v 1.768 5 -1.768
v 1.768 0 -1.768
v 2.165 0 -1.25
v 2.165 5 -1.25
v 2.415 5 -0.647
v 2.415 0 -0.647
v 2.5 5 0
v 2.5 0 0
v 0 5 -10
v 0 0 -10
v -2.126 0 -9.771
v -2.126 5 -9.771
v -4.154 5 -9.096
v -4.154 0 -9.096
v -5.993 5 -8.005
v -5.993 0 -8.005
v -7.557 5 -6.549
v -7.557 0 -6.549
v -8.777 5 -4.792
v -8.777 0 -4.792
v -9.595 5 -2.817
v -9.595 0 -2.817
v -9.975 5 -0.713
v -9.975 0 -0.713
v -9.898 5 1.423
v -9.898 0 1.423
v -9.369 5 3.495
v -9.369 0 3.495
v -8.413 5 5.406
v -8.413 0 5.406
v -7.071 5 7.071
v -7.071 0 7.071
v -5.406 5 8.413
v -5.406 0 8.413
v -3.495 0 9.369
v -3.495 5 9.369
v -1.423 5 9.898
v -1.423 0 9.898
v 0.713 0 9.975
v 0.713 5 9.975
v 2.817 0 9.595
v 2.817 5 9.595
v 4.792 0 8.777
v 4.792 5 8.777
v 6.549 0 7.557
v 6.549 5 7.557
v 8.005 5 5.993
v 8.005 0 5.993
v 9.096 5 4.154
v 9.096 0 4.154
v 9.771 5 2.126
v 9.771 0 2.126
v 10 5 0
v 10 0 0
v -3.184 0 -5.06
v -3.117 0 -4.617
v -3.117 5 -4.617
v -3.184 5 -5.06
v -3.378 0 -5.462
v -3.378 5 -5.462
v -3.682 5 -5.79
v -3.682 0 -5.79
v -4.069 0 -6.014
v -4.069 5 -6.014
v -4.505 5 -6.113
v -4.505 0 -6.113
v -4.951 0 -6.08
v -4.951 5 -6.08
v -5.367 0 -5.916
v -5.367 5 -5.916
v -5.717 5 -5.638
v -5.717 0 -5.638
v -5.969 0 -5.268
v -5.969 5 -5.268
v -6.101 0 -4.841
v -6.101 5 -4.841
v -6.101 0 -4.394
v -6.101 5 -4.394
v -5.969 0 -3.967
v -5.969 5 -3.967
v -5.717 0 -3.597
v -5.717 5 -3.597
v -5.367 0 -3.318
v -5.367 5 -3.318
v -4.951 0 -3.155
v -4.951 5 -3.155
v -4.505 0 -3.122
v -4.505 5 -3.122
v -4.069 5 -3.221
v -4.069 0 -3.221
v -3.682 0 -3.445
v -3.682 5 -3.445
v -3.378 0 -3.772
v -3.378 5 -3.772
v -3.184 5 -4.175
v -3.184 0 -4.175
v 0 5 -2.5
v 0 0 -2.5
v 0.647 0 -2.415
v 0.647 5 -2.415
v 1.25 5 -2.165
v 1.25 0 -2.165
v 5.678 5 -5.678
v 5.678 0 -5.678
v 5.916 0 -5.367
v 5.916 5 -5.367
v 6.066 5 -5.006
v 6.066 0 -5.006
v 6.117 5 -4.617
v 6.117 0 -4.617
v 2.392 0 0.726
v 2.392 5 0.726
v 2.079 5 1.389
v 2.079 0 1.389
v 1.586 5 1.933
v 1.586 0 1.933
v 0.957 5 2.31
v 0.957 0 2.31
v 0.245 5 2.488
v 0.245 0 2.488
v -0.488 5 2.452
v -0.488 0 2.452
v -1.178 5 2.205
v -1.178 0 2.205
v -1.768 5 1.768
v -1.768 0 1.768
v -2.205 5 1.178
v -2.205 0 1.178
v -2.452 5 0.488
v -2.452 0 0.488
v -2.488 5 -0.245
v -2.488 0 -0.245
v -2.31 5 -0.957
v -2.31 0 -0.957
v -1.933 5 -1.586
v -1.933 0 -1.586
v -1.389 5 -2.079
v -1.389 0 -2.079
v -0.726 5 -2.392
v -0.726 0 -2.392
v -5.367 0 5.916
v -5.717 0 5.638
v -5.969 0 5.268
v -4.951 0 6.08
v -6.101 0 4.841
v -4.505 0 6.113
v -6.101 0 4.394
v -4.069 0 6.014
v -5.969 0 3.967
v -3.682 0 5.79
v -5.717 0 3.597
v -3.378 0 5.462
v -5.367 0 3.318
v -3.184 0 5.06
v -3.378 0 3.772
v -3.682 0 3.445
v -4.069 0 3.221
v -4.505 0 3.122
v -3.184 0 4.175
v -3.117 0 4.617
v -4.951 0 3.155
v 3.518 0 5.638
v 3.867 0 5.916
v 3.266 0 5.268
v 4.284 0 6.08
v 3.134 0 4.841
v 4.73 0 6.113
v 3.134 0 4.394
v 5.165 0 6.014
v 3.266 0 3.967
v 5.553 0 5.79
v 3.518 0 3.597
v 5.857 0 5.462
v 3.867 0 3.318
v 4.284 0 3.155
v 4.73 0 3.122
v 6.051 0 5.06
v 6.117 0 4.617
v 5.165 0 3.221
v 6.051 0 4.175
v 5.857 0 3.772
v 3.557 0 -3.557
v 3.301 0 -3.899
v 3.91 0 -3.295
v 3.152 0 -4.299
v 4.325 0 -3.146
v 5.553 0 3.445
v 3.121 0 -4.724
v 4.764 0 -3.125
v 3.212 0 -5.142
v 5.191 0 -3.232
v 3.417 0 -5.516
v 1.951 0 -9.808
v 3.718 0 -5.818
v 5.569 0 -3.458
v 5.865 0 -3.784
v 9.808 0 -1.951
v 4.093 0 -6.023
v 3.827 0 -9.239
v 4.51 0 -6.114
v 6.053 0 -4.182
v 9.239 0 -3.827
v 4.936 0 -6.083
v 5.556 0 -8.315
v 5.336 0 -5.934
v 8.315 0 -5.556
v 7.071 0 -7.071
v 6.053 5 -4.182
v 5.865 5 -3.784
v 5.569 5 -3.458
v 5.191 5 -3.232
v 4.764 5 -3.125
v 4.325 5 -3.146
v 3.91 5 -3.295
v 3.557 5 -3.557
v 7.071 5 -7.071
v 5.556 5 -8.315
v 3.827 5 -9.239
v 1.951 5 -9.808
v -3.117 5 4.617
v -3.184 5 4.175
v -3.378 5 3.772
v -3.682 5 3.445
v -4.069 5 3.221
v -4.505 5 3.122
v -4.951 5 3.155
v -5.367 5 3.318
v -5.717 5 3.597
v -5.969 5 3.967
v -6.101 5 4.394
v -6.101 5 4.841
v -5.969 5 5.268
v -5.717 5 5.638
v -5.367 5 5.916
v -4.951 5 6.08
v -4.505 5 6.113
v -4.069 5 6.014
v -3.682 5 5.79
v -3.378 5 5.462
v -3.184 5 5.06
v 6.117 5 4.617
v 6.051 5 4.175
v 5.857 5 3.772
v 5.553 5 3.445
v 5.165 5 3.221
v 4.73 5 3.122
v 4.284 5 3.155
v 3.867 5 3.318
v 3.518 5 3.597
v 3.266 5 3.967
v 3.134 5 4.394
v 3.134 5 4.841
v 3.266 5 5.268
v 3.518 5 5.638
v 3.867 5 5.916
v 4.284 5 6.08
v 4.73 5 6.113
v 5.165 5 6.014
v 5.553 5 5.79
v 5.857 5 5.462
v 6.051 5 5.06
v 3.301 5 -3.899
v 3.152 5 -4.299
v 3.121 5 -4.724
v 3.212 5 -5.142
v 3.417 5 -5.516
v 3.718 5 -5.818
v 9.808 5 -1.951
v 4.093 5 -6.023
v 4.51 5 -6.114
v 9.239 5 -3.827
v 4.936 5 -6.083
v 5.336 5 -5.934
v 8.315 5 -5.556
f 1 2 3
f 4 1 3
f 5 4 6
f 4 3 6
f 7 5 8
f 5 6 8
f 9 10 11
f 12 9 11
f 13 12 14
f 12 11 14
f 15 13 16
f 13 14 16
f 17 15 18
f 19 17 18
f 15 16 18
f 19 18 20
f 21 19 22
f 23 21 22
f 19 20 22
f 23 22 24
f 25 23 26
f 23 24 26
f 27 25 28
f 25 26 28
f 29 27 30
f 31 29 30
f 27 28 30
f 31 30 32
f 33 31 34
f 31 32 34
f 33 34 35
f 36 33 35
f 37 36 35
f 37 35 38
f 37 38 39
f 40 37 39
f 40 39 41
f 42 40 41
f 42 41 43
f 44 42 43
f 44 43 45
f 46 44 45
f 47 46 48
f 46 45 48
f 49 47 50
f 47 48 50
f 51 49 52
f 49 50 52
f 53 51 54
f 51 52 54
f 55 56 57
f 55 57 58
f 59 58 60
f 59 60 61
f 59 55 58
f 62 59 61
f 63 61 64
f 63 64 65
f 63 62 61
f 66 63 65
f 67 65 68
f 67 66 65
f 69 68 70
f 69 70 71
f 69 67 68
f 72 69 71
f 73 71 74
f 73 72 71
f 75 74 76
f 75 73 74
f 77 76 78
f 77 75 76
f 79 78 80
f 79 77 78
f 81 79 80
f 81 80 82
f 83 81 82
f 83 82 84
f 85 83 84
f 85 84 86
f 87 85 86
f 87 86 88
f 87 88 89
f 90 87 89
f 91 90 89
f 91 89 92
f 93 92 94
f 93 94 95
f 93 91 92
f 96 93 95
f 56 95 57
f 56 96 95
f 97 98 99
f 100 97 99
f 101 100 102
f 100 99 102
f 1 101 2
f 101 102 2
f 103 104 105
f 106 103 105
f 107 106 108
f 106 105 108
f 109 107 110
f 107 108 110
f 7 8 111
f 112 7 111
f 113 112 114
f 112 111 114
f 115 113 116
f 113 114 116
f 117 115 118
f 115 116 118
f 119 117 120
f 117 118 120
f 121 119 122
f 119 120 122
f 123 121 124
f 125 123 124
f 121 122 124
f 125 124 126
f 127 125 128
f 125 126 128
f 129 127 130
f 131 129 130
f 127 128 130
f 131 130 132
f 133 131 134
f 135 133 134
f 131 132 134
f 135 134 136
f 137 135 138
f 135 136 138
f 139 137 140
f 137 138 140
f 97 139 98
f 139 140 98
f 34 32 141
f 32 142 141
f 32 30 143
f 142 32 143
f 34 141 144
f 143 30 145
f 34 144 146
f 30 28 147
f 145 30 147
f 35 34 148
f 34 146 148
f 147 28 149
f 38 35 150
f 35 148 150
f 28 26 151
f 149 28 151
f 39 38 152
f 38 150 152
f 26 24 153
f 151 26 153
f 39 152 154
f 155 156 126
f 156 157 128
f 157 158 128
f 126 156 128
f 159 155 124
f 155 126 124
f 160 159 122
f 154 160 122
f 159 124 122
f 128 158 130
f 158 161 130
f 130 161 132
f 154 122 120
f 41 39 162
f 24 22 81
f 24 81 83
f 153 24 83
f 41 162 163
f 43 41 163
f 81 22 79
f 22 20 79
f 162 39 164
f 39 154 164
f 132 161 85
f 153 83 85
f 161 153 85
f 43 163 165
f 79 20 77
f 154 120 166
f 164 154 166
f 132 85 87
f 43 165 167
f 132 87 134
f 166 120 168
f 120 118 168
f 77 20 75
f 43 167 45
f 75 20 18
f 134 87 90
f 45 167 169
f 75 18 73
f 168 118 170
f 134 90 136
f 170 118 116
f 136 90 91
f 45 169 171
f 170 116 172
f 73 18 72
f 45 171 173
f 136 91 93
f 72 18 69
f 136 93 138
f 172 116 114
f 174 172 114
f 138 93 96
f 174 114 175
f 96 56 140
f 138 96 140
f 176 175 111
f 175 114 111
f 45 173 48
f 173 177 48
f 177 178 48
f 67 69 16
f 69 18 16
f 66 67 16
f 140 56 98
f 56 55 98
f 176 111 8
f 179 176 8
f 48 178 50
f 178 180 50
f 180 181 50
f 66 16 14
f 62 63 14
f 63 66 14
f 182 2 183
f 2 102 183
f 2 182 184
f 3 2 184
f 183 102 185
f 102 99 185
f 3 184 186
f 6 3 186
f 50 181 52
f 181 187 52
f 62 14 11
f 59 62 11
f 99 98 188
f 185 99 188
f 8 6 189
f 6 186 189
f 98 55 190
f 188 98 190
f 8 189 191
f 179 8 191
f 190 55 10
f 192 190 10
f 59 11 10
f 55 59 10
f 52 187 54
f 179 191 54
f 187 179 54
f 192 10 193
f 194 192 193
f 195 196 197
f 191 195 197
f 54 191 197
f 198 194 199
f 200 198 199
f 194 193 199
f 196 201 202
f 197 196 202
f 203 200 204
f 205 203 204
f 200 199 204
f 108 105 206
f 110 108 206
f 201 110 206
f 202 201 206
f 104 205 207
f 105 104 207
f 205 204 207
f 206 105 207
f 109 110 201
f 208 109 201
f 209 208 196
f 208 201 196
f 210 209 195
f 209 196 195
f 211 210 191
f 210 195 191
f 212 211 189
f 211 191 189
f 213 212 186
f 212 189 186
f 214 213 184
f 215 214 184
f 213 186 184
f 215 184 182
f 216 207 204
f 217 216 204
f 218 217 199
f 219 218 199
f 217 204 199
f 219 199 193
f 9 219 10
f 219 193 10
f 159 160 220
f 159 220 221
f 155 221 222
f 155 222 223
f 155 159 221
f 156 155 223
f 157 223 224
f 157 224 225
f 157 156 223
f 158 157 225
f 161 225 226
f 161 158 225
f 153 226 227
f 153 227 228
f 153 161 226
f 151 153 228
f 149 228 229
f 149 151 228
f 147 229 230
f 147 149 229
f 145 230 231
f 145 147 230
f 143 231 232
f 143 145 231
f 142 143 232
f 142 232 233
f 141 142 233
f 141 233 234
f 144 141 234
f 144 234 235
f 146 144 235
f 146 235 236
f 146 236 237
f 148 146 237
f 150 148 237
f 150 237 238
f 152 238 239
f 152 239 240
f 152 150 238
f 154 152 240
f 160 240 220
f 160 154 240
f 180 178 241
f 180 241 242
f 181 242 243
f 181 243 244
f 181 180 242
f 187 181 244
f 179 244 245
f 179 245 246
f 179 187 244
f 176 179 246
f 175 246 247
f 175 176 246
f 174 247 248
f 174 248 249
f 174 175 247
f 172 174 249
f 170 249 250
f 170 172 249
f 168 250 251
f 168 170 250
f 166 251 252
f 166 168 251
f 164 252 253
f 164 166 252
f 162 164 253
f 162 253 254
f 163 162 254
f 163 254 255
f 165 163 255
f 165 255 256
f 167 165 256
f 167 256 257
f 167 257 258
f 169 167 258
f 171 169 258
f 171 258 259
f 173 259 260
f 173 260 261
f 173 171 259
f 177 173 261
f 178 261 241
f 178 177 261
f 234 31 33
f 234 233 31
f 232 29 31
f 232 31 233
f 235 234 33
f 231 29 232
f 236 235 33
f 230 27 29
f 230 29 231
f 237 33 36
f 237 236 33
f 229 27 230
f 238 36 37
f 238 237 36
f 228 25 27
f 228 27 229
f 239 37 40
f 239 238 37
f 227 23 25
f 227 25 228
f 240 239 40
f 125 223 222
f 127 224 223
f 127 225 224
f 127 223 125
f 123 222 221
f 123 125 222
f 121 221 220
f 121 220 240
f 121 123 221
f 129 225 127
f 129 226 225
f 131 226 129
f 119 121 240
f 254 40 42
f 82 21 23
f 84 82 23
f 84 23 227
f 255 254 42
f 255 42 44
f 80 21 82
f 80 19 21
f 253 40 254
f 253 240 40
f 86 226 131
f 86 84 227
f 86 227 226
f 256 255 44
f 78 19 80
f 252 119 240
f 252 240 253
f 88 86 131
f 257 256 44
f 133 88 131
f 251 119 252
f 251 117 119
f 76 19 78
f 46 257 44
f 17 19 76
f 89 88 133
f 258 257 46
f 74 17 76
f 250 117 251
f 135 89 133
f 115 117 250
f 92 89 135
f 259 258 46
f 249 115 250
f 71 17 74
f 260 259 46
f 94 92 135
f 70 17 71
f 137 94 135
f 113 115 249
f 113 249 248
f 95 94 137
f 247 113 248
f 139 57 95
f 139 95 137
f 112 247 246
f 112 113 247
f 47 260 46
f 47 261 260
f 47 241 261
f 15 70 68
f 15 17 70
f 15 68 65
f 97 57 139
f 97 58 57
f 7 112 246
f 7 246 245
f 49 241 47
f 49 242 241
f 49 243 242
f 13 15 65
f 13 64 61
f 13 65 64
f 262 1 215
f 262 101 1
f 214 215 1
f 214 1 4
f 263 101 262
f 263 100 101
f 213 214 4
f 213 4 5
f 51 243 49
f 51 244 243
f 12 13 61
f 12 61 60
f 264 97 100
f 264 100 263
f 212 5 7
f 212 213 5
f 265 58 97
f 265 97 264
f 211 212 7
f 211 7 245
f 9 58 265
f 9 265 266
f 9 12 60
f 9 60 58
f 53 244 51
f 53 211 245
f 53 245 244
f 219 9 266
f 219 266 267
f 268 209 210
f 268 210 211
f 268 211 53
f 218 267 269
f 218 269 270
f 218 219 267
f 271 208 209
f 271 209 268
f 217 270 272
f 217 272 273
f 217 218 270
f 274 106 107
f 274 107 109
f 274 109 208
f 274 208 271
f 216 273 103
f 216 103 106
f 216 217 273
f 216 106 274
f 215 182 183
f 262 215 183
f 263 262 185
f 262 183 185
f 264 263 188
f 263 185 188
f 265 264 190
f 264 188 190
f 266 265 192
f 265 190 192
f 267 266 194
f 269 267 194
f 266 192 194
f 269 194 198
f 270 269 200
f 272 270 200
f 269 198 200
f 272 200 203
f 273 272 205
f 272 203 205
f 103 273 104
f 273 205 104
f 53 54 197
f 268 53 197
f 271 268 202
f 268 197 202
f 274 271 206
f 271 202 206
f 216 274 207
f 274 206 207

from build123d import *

# Parameters (mm, degrees)
SKETCH_1_R      = 1.5
EXTRUDE_1_DEPTH = 5


with BuildPart() as part:
    # Эскиз1 → Бобышка-Вытянуть1 (new body)
    with BuildSketch(Plane(origin=(0, 0, 0), x_dir=(1, 0, 0), z_dir=(0, 1, 0))):
        with BuildLine():
            Line((0, 10), (0, 2.5))
            ThreePointArc((0, 2.5), (0.956708581, 2.309698831), (1.767766953, 1.767766953))
            Line((1.767766953, 1.767766953), (3.556747109, 3.556747109))
            ThreePointArc((3.556747109, 3.556747109), (3.556747109, 5.678067453), (5.678067453, 5.678067453))
            Line((5.678067453, 5.678067453), (7.071067812, 7.071067812))
            ThreePointArc((7.071067812, 7.071067812), (3.826834324, 9.238795325), (0, 10))
        make_face()
        with BuildLine():
            ThreePointArc((2.5, 0), (-1.767766953, -1.767766953), (0, 2.5))
            Line((0, 2.5), (0, 10))
            ThreePointArc((0, 10), (-7.071067812, -7.071067812), (10, 0))
            ThreePointArc((10, 0), (9.238795325, 3.826834324), (7.071067812, 7.071067812))
            Line((7.071067812, 7.071067812), (5.678067453, 5.678067453))
            ThreePointArc((5.678067453, 5.678067453), (6.00322658, 5.19143243), (6.117407281, 4.617407281))
            ThreePointArc((6.117407281, 4.617407281), (5.19143243, 3.231587982), (3.556747109, 3.556747109))
            Line((3.556747109, 3.556747109), (1.767766953, 1.767766953))
            ThreePointArc((1.767766953, 1.767766953), (2.309698831, 0.956708581), (2.5, 0))
        make_face()
        with Locations((-4.617407281, -4.617407281)):
            Circle(SKETCH_1_R, mode=Mode.SUBTRACT)
        with Locations((4.617407281, -4.617407281)):
            Circle(SKETCH_1_R, mode=Mode.SUBTRACT)
        with Locations((-4.617407281, 4.617407281)):
            Circle(SKETCH_1_R, mode=Mode.SUBTRACT)
    extrude(amount=EXTRUDE_1_DEPTH)


solid = part.part
